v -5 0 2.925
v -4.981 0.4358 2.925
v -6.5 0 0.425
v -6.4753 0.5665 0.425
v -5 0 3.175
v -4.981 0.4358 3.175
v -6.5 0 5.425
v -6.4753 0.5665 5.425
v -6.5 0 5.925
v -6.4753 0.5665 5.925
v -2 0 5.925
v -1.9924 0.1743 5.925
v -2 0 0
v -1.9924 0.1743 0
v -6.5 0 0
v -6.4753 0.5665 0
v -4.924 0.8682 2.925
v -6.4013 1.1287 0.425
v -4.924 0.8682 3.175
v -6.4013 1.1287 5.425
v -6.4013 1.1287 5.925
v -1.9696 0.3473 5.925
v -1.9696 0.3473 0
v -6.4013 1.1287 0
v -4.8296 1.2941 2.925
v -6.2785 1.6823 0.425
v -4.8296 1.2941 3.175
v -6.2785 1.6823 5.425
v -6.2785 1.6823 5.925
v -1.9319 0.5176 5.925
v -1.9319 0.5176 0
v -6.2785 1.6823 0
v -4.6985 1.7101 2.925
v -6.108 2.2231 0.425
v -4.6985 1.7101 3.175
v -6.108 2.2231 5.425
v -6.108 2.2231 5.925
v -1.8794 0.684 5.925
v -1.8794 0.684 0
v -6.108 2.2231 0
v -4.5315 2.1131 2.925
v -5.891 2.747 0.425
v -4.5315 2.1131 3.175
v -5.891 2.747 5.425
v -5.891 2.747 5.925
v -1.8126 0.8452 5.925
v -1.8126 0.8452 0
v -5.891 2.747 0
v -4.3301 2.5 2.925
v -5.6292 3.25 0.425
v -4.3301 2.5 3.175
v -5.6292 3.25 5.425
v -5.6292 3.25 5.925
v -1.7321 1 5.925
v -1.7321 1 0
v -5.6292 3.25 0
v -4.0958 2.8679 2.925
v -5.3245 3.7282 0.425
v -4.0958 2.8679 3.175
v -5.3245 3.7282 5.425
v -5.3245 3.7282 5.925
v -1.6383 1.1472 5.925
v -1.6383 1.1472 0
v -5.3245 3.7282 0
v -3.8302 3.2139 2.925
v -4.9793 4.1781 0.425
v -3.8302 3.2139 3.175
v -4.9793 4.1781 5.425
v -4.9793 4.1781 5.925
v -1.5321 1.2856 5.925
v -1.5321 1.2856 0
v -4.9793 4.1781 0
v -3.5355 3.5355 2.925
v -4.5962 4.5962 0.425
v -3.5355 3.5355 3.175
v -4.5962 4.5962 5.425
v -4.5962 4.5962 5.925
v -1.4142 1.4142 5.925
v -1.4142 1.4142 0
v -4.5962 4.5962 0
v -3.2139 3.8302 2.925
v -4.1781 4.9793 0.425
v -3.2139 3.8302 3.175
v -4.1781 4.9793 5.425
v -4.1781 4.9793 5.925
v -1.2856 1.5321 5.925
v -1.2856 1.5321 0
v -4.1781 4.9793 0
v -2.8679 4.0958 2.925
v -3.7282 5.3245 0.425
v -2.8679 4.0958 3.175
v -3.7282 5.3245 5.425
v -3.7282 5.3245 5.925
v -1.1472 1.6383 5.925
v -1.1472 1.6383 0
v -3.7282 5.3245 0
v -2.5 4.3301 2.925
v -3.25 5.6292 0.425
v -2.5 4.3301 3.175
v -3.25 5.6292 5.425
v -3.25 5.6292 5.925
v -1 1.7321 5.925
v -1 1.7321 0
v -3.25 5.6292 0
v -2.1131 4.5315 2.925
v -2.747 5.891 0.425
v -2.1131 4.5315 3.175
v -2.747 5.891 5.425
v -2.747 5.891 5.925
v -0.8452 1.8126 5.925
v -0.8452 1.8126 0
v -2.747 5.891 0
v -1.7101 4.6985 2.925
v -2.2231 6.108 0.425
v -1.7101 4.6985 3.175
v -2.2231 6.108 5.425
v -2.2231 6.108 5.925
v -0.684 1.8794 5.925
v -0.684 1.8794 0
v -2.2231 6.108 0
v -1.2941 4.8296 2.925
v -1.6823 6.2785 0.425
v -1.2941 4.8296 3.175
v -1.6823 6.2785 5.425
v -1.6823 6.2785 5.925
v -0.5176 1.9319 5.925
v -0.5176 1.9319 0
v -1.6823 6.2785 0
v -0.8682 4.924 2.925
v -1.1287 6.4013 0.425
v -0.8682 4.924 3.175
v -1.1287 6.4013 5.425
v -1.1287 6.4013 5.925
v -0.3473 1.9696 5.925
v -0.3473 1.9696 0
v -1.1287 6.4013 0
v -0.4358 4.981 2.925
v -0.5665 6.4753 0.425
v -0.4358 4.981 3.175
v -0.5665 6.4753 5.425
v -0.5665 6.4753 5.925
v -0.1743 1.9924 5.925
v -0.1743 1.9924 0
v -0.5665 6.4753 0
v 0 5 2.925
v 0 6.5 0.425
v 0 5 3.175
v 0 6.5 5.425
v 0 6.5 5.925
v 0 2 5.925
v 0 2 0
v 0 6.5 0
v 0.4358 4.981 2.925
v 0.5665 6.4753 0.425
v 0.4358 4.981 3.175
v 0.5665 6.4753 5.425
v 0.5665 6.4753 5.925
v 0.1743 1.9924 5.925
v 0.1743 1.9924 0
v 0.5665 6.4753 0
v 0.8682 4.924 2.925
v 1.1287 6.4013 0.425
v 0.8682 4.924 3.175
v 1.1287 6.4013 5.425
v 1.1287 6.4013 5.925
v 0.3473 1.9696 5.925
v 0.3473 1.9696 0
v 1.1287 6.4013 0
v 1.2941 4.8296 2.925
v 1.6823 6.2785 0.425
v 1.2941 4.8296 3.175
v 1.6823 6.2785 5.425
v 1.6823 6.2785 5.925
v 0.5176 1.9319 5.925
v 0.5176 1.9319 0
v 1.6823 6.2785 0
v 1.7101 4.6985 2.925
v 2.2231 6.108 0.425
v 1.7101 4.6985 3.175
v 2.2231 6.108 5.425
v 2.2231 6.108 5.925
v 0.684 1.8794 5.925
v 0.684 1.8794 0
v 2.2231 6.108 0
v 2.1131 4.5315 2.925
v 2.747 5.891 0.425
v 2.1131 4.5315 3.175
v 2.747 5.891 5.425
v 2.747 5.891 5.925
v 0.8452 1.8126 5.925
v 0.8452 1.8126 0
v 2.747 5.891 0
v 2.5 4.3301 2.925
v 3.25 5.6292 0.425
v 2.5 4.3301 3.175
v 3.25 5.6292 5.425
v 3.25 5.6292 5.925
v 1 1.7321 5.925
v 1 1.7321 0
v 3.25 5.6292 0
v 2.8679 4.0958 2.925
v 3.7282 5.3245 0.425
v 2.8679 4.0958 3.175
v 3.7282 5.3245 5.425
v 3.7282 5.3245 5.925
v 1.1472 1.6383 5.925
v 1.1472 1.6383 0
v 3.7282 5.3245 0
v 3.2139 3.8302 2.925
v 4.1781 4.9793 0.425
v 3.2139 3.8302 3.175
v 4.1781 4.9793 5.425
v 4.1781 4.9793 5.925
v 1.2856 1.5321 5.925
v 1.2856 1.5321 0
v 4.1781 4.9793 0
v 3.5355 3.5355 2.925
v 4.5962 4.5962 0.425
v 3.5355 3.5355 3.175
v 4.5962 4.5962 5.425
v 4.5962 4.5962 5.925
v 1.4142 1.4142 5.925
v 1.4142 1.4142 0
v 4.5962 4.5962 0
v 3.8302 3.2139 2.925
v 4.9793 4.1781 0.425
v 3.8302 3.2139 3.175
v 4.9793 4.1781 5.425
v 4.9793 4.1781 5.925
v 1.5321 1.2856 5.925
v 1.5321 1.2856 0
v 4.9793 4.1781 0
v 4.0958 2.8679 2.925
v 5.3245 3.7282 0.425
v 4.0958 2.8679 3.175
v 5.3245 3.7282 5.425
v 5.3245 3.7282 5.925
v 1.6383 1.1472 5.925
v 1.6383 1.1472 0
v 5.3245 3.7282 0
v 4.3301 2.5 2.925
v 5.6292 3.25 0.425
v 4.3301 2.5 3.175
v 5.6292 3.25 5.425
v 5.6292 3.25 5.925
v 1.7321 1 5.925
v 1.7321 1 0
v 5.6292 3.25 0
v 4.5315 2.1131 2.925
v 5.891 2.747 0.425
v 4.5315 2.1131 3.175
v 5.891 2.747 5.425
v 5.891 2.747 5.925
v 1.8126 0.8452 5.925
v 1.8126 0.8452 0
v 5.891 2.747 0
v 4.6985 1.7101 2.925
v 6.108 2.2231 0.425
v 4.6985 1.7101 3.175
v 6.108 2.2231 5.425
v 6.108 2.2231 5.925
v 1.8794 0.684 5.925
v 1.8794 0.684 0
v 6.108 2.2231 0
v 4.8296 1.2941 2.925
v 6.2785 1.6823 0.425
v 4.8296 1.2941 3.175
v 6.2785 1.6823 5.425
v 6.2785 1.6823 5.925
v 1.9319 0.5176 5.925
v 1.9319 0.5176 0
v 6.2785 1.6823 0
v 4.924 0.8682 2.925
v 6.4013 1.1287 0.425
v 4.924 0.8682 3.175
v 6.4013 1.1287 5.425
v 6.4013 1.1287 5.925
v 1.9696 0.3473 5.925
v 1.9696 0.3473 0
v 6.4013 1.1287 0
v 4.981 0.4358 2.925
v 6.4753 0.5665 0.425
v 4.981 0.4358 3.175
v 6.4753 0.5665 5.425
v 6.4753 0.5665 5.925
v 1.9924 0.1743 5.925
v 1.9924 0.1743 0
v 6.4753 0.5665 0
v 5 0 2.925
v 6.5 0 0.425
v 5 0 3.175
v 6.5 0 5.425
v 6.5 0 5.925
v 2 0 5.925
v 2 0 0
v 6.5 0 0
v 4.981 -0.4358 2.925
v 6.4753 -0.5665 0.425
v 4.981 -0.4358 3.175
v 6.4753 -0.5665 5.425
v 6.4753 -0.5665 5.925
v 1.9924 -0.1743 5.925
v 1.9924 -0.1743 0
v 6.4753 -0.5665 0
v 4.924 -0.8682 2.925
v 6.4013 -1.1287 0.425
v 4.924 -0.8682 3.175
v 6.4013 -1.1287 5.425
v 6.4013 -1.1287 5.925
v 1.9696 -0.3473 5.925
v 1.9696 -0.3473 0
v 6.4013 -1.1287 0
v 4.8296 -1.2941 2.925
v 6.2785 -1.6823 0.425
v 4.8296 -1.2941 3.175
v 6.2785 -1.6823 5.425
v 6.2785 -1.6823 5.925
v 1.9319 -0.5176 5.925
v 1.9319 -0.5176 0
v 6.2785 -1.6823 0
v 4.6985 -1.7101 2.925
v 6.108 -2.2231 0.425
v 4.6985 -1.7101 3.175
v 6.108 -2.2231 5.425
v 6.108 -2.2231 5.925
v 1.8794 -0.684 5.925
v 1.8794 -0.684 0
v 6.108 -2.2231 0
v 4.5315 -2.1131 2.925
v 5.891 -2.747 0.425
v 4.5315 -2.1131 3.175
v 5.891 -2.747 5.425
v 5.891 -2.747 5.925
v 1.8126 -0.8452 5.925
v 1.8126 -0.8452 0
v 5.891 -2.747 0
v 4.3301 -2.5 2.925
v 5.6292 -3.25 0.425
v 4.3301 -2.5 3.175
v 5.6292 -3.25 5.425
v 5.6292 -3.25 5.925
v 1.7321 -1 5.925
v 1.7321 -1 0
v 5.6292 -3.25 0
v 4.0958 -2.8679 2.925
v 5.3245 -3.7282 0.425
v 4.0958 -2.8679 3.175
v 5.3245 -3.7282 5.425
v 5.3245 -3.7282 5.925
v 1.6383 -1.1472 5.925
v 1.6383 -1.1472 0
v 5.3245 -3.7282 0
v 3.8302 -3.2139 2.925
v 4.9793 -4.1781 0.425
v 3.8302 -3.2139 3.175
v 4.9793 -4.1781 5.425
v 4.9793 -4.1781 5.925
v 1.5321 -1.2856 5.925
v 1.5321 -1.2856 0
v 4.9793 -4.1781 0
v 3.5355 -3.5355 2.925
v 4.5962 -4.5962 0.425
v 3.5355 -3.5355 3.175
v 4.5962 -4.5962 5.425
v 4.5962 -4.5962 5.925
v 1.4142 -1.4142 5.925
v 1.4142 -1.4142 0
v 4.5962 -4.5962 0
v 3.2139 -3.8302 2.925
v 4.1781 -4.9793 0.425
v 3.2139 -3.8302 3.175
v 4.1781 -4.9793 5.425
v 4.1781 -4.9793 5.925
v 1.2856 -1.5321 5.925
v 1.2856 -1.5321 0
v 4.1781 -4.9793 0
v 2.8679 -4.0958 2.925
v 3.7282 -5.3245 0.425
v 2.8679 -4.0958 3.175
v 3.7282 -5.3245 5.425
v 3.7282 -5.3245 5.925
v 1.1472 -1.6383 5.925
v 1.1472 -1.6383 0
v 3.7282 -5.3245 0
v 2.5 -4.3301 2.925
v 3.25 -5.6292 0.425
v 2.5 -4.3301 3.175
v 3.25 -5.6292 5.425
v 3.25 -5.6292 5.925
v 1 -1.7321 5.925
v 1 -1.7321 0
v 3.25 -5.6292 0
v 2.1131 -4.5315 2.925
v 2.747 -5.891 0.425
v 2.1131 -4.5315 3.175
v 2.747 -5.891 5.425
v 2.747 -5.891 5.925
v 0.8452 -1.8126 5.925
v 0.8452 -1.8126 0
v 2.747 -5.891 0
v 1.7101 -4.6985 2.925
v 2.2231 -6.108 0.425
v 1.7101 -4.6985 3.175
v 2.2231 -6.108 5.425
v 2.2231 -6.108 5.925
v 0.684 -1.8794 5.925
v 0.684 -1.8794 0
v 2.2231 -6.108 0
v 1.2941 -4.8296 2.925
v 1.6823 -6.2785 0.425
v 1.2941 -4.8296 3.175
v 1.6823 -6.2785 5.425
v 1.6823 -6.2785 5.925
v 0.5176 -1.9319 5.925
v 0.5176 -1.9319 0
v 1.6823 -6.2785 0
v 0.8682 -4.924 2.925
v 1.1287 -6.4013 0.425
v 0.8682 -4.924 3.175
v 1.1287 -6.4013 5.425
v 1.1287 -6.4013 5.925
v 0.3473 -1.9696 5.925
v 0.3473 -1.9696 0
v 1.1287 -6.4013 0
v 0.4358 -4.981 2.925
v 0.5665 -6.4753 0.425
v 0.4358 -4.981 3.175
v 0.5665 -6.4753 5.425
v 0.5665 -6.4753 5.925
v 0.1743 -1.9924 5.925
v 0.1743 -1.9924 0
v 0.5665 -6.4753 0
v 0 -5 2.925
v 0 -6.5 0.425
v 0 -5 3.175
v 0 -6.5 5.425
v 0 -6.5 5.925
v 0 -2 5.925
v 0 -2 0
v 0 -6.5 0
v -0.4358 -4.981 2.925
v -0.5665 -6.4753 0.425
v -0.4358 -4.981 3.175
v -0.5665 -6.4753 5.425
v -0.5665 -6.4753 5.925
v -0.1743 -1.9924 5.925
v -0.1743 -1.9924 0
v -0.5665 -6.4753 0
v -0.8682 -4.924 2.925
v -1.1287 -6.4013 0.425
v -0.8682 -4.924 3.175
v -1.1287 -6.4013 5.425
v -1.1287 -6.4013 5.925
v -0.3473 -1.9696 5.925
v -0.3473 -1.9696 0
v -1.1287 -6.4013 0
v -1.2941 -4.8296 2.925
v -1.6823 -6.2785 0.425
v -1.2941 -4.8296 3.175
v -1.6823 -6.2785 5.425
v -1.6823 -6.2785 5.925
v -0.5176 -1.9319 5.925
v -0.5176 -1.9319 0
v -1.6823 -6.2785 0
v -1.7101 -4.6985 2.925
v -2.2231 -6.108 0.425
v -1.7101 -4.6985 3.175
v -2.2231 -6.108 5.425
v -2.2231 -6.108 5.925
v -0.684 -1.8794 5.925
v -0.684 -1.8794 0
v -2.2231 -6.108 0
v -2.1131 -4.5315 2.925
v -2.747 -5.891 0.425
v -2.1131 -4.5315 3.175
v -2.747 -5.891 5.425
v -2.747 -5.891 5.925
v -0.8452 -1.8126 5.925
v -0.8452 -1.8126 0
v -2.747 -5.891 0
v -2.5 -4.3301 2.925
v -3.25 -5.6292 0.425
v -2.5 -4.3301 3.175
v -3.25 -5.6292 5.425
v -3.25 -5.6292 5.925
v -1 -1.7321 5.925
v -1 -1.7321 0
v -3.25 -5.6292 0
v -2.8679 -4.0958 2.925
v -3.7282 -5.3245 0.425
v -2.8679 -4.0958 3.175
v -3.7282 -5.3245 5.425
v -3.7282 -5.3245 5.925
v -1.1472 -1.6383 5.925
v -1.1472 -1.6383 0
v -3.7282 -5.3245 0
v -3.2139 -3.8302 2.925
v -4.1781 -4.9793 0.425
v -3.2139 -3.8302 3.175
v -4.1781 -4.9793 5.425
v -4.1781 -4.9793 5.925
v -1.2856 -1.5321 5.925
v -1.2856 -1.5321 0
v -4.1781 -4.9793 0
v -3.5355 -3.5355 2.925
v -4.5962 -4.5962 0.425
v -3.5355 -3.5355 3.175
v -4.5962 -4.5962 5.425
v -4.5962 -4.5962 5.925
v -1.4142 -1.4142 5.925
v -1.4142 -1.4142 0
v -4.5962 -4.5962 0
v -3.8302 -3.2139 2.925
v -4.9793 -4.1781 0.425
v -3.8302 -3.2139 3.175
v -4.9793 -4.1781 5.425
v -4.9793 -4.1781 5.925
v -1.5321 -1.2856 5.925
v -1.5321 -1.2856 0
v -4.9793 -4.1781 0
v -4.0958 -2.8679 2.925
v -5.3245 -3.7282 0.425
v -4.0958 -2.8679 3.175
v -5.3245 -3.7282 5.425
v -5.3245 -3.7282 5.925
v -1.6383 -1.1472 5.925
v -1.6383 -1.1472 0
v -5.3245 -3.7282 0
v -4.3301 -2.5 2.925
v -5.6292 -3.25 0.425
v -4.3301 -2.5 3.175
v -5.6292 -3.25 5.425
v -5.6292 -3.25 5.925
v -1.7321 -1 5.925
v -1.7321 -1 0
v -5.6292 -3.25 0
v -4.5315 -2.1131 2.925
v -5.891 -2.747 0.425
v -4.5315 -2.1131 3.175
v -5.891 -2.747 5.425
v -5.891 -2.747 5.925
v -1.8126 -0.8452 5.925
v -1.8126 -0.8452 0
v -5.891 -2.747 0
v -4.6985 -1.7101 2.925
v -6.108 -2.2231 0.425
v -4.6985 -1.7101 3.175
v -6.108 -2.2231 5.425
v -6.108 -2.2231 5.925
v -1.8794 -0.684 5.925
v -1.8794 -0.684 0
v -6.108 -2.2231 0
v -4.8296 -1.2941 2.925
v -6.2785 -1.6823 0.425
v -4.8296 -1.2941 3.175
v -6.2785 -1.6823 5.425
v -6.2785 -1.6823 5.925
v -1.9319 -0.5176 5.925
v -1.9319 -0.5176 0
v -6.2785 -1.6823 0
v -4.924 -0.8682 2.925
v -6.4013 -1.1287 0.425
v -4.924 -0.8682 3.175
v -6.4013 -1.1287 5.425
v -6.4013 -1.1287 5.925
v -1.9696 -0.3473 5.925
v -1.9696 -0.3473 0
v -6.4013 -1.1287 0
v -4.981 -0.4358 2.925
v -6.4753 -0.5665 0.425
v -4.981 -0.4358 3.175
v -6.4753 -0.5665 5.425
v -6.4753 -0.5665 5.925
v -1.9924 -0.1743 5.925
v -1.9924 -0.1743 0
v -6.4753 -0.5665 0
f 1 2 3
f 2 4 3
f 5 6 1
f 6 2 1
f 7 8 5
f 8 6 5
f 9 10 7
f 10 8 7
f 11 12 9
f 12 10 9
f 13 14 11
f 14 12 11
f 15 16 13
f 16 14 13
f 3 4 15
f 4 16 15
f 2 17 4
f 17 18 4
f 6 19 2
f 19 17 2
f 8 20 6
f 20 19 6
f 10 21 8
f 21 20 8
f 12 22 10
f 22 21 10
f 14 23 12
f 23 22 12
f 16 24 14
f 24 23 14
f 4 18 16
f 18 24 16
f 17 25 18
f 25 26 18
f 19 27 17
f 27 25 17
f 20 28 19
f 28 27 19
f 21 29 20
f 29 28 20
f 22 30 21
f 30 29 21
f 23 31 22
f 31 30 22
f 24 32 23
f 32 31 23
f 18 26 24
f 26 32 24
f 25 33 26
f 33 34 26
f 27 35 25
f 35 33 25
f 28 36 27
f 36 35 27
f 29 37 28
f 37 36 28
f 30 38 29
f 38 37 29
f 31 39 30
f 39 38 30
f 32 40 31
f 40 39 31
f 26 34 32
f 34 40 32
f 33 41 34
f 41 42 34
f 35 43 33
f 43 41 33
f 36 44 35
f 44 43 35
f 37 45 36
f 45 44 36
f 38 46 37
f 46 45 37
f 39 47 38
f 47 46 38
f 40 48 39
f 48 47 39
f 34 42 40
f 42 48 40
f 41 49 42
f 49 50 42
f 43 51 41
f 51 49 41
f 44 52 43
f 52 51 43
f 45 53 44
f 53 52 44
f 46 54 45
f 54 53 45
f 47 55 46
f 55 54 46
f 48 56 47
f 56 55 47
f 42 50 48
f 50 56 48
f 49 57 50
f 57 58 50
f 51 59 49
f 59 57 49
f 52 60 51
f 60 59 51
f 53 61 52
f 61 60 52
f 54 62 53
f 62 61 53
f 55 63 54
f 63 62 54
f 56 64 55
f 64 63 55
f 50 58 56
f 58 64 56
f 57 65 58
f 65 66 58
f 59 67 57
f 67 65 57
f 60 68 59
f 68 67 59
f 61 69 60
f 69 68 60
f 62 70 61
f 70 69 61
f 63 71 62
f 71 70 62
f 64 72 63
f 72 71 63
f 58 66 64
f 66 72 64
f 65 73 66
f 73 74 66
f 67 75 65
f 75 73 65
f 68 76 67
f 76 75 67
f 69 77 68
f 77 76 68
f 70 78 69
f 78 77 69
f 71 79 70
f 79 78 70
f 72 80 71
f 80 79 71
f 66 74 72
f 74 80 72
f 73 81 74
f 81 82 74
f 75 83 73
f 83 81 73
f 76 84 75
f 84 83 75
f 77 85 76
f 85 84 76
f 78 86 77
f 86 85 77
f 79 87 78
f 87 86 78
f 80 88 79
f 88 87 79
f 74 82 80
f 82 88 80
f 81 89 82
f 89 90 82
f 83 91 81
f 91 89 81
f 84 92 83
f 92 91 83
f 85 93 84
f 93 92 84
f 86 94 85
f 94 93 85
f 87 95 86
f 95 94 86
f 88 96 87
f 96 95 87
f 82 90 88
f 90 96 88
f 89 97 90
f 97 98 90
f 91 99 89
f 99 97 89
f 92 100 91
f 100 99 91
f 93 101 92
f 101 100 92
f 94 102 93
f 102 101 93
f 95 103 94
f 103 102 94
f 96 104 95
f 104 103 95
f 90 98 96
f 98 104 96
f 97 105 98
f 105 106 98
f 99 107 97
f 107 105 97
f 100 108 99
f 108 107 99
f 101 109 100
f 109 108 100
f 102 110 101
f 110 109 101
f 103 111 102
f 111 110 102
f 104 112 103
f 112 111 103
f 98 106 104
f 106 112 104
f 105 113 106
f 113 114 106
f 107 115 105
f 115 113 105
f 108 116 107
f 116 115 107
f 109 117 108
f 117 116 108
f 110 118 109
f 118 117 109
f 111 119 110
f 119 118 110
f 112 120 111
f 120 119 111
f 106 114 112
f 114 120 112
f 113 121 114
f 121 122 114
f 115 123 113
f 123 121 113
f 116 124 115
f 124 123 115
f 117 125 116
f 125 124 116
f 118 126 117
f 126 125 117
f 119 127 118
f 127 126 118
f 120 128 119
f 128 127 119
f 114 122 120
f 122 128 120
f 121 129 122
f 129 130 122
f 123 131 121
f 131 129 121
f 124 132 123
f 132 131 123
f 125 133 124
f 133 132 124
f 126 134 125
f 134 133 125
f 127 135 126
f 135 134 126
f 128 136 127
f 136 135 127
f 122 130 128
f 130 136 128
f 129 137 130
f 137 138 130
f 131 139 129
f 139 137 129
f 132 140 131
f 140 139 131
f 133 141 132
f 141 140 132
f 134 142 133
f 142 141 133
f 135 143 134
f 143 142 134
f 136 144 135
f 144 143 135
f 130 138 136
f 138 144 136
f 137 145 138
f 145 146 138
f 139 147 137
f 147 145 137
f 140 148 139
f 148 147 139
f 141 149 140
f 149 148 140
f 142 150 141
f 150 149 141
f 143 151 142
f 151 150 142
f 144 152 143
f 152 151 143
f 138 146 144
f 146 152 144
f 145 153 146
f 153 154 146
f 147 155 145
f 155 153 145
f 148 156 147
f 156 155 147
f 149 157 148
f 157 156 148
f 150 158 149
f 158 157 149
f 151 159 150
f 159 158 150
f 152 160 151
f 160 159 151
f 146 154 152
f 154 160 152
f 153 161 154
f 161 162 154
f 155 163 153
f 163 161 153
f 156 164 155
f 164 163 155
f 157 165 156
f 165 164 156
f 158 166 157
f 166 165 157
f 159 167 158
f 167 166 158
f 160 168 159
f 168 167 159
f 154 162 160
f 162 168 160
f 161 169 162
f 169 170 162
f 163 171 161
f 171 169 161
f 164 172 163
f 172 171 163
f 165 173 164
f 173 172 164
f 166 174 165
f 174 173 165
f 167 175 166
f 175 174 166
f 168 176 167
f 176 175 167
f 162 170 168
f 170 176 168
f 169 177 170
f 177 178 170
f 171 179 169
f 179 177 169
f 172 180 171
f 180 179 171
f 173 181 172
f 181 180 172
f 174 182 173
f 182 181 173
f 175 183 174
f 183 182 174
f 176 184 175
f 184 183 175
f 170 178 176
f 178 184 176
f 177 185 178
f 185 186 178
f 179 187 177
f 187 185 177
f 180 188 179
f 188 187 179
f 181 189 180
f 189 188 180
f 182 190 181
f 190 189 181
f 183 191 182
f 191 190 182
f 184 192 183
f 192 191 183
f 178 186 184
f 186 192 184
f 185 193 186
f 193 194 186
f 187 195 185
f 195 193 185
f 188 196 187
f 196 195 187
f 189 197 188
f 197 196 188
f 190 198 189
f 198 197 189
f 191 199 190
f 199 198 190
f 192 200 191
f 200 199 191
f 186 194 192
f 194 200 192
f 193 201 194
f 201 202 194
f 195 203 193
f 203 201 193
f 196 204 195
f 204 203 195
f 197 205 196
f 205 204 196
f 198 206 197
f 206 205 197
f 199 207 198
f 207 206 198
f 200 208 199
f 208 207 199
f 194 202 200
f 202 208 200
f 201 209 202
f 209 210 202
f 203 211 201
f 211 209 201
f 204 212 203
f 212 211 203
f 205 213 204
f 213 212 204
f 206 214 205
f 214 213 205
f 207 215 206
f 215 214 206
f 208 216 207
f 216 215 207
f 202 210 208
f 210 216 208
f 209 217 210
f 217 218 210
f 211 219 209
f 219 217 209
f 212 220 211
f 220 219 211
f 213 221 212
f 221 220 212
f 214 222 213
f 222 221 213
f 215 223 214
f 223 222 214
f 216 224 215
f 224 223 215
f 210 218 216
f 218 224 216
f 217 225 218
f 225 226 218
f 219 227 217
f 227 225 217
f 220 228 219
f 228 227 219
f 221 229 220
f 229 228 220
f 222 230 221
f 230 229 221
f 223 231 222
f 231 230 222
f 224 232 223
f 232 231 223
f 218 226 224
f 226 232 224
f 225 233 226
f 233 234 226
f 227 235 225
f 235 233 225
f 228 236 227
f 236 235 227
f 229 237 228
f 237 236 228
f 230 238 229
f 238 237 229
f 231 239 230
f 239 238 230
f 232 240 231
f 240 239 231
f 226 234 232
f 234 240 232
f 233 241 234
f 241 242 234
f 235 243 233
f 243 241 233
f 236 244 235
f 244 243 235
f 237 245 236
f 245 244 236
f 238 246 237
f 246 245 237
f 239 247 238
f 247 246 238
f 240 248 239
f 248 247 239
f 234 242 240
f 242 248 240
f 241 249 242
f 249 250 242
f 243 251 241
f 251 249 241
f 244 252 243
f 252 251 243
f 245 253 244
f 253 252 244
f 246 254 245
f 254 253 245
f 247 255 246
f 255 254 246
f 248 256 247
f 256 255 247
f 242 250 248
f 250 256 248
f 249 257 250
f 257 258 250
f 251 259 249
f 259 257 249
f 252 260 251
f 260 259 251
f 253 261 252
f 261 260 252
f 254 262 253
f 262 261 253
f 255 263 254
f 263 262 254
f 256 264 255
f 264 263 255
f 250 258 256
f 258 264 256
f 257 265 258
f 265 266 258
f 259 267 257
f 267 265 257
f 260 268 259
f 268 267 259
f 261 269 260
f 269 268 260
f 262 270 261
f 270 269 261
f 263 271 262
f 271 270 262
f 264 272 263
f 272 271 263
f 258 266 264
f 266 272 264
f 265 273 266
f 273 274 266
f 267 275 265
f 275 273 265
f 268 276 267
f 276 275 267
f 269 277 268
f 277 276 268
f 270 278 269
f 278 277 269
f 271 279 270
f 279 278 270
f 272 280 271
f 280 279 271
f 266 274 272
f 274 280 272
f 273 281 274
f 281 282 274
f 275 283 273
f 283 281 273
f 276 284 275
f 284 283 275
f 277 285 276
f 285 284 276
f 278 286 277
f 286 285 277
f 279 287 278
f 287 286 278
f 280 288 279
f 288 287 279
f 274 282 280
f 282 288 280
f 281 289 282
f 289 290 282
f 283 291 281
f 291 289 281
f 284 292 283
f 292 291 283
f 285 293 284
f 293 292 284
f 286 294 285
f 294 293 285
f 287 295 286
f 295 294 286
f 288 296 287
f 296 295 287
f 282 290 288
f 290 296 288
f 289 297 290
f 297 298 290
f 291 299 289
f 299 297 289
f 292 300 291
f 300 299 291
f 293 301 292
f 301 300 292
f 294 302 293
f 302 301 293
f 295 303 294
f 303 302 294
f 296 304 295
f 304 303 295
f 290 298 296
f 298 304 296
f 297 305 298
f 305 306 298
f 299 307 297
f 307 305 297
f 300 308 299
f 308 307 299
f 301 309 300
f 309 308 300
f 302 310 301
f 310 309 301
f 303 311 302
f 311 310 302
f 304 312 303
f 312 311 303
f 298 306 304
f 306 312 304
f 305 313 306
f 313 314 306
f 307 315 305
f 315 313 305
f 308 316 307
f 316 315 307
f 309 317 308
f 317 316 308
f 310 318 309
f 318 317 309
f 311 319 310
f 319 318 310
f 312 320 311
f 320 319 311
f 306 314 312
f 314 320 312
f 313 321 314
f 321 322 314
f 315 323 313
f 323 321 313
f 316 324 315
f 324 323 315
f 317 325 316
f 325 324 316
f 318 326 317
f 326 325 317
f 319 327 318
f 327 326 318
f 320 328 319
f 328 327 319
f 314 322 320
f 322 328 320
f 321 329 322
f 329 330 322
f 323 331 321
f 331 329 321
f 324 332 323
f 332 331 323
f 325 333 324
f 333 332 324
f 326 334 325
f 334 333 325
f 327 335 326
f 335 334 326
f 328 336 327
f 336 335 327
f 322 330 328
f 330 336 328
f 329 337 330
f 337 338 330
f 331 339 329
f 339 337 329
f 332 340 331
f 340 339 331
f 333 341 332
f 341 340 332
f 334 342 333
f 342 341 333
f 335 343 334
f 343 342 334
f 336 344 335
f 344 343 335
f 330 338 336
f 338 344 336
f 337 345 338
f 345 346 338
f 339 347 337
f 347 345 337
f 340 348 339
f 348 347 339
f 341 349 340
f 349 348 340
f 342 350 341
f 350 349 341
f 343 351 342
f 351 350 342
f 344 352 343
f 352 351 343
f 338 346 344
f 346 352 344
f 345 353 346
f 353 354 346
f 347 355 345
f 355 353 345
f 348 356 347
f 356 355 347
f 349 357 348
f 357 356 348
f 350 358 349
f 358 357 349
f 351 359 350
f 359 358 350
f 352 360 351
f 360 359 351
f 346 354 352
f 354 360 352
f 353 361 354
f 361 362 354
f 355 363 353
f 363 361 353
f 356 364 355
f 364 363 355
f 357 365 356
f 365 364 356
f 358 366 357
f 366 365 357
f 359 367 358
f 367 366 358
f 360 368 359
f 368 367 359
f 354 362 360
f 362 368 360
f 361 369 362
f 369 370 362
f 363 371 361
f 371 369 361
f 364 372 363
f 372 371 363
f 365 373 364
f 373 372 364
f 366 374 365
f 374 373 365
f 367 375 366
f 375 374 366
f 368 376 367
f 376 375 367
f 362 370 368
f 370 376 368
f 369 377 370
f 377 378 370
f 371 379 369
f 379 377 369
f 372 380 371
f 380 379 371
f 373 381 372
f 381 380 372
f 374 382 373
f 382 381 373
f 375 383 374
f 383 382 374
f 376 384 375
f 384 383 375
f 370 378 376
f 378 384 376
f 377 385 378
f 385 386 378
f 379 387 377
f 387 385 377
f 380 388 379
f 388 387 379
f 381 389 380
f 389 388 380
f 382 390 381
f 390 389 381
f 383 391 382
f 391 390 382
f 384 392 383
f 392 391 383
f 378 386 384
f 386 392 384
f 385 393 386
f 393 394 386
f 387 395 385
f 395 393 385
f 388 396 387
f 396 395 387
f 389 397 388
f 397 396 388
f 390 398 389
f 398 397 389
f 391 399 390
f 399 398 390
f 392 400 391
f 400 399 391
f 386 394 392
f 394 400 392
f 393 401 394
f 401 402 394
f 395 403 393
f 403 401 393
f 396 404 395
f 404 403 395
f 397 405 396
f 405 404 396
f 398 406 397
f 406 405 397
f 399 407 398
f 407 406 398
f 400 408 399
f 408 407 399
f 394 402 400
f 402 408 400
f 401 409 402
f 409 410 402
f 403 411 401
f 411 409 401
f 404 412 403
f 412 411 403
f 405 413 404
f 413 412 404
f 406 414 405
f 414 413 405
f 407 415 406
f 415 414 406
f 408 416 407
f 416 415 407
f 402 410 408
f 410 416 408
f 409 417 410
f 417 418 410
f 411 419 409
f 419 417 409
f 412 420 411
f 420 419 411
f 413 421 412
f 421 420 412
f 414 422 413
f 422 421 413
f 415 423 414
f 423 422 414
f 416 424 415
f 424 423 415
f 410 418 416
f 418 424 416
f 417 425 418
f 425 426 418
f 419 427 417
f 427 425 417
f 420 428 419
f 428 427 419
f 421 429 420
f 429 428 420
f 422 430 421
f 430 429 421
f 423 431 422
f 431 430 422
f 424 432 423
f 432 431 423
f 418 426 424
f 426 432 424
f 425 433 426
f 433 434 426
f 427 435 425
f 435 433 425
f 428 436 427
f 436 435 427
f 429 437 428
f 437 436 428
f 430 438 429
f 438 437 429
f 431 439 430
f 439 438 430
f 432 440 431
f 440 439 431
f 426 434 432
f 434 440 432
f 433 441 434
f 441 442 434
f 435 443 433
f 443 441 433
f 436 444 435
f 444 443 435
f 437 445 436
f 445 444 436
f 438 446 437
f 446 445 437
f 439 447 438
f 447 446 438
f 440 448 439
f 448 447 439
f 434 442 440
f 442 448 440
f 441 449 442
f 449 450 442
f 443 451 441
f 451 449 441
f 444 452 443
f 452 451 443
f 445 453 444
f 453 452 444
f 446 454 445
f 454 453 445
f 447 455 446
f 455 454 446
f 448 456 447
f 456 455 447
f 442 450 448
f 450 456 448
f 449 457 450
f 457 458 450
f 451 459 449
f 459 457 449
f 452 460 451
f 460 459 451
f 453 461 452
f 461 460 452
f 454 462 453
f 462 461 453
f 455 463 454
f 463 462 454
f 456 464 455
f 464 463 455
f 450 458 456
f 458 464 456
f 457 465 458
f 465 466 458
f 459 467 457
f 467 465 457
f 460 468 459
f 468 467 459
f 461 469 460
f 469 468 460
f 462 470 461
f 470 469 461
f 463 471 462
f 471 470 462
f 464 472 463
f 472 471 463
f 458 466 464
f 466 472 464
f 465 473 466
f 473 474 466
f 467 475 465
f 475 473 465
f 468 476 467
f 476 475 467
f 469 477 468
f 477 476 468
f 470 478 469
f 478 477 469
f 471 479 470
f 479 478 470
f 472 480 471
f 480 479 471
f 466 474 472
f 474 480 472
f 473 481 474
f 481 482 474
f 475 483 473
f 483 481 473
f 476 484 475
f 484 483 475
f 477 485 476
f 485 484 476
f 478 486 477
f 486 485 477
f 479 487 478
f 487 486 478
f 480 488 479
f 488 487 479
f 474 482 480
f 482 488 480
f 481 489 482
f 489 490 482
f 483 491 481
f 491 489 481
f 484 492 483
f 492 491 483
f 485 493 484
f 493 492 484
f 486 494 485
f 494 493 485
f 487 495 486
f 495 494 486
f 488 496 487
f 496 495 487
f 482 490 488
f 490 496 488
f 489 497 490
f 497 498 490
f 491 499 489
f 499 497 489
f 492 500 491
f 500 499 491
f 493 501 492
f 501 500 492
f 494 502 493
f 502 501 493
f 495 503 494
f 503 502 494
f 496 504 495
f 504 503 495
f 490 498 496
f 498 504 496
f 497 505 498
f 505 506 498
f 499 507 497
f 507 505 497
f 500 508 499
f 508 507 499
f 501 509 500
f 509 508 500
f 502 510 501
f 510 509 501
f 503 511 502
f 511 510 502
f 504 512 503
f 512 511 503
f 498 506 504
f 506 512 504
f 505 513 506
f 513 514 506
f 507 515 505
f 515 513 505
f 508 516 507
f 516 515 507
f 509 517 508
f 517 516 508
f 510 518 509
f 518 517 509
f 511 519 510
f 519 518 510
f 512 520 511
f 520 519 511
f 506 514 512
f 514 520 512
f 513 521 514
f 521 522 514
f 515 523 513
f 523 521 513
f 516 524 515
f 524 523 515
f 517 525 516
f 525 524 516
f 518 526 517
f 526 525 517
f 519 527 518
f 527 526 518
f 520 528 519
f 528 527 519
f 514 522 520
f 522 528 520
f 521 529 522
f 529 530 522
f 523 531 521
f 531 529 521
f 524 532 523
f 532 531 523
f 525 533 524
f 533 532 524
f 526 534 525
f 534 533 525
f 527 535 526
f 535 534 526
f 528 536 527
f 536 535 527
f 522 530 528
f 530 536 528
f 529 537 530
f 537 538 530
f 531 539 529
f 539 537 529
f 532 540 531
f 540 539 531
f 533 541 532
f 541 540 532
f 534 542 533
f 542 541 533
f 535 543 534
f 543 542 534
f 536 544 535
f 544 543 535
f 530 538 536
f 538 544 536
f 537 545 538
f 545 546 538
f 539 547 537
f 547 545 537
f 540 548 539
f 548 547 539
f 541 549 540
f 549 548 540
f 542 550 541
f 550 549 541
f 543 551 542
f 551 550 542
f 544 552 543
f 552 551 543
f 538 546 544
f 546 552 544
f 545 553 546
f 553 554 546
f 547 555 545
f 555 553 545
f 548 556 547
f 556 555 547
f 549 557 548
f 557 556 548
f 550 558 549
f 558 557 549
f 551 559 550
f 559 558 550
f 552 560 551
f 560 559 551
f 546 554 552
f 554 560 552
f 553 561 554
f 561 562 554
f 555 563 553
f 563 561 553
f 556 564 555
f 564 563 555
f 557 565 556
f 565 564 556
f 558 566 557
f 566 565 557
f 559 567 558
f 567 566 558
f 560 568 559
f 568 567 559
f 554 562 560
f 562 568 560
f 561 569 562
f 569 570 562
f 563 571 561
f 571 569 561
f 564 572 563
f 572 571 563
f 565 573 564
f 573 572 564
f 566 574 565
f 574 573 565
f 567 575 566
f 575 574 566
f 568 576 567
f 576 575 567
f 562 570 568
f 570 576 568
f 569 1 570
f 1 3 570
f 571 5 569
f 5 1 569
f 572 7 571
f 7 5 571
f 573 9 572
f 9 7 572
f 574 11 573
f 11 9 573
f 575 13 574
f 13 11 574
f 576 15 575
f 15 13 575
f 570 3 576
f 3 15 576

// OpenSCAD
$fn = 72;

rotate_extrude()
    polygon([[2, 0], [6.5, 0], [6.5, 0.425], [5.0, 2.925],
             [5.0, 3.175], [6.5, 5.425], [6.5, 5.925], [2, 5.925]]);
